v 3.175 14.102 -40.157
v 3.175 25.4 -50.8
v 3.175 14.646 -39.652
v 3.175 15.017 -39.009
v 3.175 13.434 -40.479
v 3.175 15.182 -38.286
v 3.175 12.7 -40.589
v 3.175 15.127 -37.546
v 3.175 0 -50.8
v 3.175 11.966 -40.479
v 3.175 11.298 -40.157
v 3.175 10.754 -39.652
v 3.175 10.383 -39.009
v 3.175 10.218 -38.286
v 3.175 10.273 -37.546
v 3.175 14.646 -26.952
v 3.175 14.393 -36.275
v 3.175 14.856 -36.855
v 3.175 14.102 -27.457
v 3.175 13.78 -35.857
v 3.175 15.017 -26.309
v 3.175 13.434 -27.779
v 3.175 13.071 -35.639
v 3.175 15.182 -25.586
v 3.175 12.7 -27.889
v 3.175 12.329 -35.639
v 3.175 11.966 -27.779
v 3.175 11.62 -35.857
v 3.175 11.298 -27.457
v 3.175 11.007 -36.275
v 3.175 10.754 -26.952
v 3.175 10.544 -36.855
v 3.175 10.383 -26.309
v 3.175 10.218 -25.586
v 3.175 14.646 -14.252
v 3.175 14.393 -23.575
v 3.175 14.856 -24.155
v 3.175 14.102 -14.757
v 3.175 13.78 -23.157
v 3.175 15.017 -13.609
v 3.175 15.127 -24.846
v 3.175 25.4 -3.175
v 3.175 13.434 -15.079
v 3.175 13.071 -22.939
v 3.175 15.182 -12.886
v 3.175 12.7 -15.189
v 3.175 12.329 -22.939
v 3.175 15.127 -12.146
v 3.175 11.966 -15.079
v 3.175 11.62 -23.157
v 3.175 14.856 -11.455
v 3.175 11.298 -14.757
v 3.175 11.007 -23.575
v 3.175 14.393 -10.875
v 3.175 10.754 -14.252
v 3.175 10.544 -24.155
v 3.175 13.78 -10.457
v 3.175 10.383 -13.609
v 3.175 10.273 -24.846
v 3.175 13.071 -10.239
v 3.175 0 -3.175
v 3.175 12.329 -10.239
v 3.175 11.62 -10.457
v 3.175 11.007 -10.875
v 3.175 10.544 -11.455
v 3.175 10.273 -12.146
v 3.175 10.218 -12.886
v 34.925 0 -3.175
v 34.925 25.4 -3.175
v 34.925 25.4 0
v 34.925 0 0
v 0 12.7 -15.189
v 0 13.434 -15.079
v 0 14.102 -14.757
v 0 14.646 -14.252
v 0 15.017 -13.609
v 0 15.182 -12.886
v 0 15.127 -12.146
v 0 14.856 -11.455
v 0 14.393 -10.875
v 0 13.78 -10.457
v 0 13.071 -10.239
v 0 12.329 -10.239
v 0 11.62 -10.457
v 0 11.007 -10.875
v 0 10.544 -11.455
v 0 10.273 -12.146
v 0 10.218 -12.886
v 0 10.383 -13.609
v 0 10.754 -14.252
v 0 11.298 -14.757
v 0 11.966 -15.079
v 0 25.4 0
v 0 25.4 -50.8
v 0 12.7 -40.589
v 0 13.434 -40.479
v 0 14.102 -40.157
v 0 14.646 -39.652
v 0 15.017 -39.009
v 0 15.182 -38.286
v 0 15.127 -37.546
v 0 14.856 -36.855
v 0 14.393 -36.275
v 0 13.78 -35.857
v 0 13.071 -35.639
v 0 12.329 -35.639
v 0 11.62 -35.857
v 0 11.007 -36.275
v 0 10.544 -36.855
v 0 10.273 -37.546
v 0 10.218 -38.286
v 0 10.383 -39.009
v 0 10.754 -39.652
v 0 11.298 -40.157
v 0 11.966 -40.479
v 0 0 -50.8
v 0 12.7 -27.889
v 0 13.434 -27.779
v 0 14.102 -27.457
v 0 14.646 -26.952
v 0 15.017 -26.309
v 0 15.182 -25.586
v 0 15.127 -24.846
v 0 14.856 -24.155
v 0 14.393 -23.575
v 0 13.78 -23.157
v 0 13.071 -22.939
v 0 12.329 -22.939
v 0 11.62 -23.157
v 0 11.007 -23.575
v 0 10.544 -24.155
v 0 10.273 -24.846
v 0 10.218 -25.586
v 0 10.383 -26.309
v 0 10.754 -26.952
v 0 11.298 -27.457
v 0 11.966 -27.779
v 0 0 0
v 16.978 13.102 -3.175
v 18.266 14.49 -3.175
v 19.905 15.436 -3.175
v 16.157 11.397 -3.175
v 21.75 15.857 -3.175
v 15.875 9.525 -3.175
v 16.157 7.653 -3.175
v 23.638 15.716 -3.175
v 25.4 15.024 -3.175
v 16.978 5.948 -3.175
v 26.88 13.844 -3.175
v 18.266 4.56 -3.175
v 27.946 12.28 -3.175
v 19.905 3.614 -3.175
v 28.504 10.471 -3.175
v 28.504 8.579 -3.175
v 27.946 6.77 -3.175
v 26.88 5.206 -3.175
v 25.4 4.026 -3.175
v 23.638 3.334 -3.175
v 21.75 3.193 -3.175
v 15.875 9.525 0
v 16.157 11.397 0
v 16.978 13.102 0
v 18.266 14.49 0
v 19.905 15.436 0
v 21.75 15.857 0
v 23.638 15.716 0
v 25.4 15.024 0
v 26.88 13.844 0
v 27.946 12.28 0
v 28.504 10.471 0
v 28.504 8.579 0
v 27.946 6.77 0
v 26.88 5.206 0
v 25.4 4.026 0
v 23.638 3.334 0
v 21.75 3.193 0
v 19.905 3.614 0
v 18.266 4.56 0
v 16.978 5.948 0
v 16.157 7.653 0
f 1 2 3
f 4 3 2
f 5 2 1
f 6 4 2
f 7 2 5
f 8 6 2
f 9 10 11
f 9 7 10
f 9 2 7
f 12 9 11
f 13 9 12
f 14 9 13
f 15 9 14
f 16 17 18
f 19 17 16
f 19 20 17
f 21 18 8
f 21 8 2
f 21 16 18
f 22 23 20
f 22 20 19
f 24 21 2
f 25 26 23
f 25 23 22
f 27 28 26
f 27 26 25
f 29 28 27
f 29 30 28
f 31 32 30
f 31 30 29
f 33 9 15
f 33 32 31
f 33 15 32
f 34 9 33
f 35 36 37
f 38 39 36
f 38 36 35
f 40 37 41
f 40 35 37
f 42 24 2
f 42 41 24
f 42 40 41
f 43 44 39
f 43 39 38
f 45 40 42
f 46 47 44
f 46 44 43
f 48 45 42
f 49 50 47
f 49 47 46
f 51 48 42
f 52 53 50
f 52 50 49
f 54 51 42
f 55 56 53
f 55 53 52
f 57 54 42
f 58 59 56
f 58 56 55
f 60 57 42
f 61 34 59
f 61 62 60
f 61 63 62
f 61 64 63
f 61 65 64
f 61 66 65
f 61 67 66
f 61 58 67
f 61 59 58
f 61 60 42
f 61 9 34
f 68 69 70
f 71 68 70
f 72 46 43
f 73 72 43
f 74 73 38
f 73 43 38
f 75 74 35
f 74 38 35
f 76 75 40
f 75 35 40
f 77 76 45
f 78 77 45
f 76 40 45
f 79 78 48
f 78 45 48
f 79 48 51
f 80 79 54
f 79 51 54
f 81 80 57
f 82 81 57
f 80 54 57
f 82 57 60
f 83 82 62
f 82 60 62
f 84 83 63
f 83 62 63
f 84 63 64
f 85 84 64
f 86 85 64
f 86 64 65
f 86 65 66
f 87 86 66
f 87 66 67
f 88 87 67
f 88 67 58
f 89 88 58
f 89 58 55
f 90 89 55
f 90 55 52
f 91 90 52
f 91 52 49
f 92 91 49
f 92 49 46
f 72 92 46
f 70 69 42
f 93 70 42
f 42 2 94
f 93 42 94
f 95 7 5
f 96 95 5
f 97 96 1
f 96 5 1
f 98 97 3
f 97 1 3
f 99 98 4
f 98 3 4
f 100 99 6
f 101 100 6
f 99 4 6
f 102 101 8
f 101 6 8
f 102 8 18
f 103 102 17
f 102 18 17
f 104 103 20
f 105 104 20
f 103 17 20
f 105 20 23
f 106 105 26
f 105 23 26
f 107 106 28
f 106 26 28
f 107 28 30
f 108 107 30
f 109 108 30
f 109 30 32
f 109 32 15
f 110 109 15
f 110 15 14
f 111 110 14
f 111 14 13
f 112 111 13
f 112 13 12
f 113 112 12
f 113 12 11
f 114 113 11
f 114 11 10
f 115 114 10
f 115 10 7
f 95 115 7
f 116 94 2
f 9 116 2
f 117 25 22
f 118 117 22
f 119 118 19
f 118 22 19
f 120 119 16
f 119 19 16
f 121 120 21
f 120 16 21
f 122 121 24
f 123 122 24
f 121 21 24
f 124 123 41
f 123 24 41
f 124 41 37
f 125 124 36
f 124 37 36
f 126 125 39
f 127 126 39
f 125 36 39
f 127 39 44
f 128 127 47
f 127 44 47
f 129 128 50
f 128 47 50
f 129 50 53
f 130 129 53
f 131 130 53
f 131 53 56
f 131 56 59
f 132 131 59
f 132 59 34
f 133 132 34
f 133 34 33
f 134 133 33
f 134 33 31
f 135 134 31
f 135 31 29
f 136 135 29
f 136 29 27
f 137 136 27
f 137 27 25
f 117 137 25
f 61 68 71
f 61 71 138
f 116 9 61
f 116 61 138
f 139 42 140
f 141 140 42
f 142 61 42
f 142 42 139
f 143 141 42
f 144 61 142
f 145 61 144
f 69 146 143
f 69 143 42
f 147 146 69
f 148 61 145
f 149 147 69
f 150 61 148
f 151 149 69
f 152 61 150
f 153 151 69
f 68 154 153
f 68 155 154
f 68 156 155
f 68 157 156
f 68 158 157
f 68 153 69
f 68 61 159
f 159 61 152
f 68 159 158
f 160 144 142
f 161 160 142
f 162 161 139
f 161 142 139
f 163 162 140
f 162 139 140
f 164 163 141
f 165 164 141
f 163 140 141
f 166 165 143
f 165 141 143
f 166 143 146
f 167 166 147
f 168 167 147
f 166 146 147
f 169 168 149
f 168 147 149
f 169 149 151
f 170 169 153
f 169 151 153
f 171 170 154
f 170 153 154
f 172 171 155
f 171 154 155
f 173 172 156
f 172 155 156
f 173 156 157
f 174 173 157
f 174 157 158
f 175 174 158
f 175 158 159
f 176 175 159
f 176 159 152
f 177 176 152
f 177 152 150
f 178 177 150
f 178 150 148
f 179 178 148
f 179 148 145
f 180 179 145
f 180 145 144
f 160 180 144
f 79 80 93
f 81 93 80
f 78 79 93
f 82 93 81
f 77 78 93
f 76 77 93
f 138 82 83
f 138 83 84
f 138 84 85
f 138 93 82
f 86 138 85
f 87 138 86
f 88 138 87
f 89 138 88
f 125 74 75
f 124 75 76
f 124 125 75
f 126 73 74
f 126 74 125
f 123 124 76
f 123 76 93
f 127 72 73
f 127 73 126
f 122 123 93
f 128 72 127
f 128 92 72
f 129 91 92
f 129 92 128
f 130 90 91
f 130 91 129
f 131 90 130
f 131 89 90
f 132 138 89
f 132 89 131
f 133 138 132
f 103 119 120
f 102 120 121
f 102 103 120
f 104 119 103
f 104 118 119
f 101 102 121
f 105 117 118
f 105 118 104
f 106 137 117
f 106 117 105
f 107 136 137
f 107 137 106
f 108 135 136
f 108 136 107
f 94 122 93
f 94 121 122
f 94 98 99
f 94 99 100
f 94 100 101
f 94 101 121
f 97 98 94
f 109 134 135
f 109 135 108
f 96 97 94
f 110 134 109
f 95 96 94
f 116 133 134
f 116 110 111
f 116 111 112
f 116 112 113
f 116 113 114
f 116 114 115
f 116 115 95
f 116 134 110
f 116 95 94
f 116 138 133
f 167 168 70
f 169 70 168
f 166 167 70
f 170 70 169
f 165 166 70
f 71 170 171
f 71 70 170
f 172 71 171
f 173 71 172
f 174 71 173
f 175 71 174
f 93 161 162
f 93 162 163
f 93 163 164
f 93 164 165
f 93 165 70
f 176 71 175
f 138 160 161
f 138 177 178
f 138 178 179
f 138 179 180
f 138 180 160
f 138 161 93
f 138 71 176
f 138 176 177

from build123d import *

# Parameters (mm, degrees)
BOSS_EXTRUDE1_DEPTH = 25.4
SKETCH3_R           = 6.35
CUT_EXTRUDE1_DEPTH  = 65.288850122
SKETCH4_R           = 2.4892
CUT_EXTRUDE2_DEPTH  = 66.068137364


with BuildPart() as part:
    # Sketch2 → Boss-Extrude1 (new body)
    with BuildSketch(Plane(origin=(0, 0, 0), x_dir=(1, 0, 0), z_dir=(0, 1, 0))):
        Polygon((0, 0), (0, 50.8), (3.175, 50.8), (3.175, 3.175), (34.925, 3.175), (34.925, 0), align=None)
    extrude(amount=BOSS_EXTRUDE1_DEPTH)

    # Sketch3 → Cut-Extrude1 (cut, through all)
    with BuildSketch(Plane(origin=(0, 0, -3.175), x_dir=(-1, 0, 0), z_dir=(0, 0, -1))):
        with Locations((-22.225, 9.525)):
            Circle(SKETCH3_R)
    extrude(amount=-CUT_EXTRUDE1_DEPTH, mode=Mode.SUBTRACT)

    # Sketch4 → Cut-Extrude2 (cut, through all)
    with BuildSketch(Plane(origin=(3.175, 0, 0), x_dir=(0, 0, -1), z_dir=(1, 0, 0))):
        with Locations((25.4, 12.7)):
            Circle(SKETCH4_R)
        with Locations((12.7, 12.7)):
            Circle(SKETCH4_R)
        with Locations((38.1, 12.7)):
            Circle(SKETCH4_R)
    extrude(amount=-CUT_EXTRUDE2_DEPTH, mode=Mode.SUBTRACT)


solid = part.part
